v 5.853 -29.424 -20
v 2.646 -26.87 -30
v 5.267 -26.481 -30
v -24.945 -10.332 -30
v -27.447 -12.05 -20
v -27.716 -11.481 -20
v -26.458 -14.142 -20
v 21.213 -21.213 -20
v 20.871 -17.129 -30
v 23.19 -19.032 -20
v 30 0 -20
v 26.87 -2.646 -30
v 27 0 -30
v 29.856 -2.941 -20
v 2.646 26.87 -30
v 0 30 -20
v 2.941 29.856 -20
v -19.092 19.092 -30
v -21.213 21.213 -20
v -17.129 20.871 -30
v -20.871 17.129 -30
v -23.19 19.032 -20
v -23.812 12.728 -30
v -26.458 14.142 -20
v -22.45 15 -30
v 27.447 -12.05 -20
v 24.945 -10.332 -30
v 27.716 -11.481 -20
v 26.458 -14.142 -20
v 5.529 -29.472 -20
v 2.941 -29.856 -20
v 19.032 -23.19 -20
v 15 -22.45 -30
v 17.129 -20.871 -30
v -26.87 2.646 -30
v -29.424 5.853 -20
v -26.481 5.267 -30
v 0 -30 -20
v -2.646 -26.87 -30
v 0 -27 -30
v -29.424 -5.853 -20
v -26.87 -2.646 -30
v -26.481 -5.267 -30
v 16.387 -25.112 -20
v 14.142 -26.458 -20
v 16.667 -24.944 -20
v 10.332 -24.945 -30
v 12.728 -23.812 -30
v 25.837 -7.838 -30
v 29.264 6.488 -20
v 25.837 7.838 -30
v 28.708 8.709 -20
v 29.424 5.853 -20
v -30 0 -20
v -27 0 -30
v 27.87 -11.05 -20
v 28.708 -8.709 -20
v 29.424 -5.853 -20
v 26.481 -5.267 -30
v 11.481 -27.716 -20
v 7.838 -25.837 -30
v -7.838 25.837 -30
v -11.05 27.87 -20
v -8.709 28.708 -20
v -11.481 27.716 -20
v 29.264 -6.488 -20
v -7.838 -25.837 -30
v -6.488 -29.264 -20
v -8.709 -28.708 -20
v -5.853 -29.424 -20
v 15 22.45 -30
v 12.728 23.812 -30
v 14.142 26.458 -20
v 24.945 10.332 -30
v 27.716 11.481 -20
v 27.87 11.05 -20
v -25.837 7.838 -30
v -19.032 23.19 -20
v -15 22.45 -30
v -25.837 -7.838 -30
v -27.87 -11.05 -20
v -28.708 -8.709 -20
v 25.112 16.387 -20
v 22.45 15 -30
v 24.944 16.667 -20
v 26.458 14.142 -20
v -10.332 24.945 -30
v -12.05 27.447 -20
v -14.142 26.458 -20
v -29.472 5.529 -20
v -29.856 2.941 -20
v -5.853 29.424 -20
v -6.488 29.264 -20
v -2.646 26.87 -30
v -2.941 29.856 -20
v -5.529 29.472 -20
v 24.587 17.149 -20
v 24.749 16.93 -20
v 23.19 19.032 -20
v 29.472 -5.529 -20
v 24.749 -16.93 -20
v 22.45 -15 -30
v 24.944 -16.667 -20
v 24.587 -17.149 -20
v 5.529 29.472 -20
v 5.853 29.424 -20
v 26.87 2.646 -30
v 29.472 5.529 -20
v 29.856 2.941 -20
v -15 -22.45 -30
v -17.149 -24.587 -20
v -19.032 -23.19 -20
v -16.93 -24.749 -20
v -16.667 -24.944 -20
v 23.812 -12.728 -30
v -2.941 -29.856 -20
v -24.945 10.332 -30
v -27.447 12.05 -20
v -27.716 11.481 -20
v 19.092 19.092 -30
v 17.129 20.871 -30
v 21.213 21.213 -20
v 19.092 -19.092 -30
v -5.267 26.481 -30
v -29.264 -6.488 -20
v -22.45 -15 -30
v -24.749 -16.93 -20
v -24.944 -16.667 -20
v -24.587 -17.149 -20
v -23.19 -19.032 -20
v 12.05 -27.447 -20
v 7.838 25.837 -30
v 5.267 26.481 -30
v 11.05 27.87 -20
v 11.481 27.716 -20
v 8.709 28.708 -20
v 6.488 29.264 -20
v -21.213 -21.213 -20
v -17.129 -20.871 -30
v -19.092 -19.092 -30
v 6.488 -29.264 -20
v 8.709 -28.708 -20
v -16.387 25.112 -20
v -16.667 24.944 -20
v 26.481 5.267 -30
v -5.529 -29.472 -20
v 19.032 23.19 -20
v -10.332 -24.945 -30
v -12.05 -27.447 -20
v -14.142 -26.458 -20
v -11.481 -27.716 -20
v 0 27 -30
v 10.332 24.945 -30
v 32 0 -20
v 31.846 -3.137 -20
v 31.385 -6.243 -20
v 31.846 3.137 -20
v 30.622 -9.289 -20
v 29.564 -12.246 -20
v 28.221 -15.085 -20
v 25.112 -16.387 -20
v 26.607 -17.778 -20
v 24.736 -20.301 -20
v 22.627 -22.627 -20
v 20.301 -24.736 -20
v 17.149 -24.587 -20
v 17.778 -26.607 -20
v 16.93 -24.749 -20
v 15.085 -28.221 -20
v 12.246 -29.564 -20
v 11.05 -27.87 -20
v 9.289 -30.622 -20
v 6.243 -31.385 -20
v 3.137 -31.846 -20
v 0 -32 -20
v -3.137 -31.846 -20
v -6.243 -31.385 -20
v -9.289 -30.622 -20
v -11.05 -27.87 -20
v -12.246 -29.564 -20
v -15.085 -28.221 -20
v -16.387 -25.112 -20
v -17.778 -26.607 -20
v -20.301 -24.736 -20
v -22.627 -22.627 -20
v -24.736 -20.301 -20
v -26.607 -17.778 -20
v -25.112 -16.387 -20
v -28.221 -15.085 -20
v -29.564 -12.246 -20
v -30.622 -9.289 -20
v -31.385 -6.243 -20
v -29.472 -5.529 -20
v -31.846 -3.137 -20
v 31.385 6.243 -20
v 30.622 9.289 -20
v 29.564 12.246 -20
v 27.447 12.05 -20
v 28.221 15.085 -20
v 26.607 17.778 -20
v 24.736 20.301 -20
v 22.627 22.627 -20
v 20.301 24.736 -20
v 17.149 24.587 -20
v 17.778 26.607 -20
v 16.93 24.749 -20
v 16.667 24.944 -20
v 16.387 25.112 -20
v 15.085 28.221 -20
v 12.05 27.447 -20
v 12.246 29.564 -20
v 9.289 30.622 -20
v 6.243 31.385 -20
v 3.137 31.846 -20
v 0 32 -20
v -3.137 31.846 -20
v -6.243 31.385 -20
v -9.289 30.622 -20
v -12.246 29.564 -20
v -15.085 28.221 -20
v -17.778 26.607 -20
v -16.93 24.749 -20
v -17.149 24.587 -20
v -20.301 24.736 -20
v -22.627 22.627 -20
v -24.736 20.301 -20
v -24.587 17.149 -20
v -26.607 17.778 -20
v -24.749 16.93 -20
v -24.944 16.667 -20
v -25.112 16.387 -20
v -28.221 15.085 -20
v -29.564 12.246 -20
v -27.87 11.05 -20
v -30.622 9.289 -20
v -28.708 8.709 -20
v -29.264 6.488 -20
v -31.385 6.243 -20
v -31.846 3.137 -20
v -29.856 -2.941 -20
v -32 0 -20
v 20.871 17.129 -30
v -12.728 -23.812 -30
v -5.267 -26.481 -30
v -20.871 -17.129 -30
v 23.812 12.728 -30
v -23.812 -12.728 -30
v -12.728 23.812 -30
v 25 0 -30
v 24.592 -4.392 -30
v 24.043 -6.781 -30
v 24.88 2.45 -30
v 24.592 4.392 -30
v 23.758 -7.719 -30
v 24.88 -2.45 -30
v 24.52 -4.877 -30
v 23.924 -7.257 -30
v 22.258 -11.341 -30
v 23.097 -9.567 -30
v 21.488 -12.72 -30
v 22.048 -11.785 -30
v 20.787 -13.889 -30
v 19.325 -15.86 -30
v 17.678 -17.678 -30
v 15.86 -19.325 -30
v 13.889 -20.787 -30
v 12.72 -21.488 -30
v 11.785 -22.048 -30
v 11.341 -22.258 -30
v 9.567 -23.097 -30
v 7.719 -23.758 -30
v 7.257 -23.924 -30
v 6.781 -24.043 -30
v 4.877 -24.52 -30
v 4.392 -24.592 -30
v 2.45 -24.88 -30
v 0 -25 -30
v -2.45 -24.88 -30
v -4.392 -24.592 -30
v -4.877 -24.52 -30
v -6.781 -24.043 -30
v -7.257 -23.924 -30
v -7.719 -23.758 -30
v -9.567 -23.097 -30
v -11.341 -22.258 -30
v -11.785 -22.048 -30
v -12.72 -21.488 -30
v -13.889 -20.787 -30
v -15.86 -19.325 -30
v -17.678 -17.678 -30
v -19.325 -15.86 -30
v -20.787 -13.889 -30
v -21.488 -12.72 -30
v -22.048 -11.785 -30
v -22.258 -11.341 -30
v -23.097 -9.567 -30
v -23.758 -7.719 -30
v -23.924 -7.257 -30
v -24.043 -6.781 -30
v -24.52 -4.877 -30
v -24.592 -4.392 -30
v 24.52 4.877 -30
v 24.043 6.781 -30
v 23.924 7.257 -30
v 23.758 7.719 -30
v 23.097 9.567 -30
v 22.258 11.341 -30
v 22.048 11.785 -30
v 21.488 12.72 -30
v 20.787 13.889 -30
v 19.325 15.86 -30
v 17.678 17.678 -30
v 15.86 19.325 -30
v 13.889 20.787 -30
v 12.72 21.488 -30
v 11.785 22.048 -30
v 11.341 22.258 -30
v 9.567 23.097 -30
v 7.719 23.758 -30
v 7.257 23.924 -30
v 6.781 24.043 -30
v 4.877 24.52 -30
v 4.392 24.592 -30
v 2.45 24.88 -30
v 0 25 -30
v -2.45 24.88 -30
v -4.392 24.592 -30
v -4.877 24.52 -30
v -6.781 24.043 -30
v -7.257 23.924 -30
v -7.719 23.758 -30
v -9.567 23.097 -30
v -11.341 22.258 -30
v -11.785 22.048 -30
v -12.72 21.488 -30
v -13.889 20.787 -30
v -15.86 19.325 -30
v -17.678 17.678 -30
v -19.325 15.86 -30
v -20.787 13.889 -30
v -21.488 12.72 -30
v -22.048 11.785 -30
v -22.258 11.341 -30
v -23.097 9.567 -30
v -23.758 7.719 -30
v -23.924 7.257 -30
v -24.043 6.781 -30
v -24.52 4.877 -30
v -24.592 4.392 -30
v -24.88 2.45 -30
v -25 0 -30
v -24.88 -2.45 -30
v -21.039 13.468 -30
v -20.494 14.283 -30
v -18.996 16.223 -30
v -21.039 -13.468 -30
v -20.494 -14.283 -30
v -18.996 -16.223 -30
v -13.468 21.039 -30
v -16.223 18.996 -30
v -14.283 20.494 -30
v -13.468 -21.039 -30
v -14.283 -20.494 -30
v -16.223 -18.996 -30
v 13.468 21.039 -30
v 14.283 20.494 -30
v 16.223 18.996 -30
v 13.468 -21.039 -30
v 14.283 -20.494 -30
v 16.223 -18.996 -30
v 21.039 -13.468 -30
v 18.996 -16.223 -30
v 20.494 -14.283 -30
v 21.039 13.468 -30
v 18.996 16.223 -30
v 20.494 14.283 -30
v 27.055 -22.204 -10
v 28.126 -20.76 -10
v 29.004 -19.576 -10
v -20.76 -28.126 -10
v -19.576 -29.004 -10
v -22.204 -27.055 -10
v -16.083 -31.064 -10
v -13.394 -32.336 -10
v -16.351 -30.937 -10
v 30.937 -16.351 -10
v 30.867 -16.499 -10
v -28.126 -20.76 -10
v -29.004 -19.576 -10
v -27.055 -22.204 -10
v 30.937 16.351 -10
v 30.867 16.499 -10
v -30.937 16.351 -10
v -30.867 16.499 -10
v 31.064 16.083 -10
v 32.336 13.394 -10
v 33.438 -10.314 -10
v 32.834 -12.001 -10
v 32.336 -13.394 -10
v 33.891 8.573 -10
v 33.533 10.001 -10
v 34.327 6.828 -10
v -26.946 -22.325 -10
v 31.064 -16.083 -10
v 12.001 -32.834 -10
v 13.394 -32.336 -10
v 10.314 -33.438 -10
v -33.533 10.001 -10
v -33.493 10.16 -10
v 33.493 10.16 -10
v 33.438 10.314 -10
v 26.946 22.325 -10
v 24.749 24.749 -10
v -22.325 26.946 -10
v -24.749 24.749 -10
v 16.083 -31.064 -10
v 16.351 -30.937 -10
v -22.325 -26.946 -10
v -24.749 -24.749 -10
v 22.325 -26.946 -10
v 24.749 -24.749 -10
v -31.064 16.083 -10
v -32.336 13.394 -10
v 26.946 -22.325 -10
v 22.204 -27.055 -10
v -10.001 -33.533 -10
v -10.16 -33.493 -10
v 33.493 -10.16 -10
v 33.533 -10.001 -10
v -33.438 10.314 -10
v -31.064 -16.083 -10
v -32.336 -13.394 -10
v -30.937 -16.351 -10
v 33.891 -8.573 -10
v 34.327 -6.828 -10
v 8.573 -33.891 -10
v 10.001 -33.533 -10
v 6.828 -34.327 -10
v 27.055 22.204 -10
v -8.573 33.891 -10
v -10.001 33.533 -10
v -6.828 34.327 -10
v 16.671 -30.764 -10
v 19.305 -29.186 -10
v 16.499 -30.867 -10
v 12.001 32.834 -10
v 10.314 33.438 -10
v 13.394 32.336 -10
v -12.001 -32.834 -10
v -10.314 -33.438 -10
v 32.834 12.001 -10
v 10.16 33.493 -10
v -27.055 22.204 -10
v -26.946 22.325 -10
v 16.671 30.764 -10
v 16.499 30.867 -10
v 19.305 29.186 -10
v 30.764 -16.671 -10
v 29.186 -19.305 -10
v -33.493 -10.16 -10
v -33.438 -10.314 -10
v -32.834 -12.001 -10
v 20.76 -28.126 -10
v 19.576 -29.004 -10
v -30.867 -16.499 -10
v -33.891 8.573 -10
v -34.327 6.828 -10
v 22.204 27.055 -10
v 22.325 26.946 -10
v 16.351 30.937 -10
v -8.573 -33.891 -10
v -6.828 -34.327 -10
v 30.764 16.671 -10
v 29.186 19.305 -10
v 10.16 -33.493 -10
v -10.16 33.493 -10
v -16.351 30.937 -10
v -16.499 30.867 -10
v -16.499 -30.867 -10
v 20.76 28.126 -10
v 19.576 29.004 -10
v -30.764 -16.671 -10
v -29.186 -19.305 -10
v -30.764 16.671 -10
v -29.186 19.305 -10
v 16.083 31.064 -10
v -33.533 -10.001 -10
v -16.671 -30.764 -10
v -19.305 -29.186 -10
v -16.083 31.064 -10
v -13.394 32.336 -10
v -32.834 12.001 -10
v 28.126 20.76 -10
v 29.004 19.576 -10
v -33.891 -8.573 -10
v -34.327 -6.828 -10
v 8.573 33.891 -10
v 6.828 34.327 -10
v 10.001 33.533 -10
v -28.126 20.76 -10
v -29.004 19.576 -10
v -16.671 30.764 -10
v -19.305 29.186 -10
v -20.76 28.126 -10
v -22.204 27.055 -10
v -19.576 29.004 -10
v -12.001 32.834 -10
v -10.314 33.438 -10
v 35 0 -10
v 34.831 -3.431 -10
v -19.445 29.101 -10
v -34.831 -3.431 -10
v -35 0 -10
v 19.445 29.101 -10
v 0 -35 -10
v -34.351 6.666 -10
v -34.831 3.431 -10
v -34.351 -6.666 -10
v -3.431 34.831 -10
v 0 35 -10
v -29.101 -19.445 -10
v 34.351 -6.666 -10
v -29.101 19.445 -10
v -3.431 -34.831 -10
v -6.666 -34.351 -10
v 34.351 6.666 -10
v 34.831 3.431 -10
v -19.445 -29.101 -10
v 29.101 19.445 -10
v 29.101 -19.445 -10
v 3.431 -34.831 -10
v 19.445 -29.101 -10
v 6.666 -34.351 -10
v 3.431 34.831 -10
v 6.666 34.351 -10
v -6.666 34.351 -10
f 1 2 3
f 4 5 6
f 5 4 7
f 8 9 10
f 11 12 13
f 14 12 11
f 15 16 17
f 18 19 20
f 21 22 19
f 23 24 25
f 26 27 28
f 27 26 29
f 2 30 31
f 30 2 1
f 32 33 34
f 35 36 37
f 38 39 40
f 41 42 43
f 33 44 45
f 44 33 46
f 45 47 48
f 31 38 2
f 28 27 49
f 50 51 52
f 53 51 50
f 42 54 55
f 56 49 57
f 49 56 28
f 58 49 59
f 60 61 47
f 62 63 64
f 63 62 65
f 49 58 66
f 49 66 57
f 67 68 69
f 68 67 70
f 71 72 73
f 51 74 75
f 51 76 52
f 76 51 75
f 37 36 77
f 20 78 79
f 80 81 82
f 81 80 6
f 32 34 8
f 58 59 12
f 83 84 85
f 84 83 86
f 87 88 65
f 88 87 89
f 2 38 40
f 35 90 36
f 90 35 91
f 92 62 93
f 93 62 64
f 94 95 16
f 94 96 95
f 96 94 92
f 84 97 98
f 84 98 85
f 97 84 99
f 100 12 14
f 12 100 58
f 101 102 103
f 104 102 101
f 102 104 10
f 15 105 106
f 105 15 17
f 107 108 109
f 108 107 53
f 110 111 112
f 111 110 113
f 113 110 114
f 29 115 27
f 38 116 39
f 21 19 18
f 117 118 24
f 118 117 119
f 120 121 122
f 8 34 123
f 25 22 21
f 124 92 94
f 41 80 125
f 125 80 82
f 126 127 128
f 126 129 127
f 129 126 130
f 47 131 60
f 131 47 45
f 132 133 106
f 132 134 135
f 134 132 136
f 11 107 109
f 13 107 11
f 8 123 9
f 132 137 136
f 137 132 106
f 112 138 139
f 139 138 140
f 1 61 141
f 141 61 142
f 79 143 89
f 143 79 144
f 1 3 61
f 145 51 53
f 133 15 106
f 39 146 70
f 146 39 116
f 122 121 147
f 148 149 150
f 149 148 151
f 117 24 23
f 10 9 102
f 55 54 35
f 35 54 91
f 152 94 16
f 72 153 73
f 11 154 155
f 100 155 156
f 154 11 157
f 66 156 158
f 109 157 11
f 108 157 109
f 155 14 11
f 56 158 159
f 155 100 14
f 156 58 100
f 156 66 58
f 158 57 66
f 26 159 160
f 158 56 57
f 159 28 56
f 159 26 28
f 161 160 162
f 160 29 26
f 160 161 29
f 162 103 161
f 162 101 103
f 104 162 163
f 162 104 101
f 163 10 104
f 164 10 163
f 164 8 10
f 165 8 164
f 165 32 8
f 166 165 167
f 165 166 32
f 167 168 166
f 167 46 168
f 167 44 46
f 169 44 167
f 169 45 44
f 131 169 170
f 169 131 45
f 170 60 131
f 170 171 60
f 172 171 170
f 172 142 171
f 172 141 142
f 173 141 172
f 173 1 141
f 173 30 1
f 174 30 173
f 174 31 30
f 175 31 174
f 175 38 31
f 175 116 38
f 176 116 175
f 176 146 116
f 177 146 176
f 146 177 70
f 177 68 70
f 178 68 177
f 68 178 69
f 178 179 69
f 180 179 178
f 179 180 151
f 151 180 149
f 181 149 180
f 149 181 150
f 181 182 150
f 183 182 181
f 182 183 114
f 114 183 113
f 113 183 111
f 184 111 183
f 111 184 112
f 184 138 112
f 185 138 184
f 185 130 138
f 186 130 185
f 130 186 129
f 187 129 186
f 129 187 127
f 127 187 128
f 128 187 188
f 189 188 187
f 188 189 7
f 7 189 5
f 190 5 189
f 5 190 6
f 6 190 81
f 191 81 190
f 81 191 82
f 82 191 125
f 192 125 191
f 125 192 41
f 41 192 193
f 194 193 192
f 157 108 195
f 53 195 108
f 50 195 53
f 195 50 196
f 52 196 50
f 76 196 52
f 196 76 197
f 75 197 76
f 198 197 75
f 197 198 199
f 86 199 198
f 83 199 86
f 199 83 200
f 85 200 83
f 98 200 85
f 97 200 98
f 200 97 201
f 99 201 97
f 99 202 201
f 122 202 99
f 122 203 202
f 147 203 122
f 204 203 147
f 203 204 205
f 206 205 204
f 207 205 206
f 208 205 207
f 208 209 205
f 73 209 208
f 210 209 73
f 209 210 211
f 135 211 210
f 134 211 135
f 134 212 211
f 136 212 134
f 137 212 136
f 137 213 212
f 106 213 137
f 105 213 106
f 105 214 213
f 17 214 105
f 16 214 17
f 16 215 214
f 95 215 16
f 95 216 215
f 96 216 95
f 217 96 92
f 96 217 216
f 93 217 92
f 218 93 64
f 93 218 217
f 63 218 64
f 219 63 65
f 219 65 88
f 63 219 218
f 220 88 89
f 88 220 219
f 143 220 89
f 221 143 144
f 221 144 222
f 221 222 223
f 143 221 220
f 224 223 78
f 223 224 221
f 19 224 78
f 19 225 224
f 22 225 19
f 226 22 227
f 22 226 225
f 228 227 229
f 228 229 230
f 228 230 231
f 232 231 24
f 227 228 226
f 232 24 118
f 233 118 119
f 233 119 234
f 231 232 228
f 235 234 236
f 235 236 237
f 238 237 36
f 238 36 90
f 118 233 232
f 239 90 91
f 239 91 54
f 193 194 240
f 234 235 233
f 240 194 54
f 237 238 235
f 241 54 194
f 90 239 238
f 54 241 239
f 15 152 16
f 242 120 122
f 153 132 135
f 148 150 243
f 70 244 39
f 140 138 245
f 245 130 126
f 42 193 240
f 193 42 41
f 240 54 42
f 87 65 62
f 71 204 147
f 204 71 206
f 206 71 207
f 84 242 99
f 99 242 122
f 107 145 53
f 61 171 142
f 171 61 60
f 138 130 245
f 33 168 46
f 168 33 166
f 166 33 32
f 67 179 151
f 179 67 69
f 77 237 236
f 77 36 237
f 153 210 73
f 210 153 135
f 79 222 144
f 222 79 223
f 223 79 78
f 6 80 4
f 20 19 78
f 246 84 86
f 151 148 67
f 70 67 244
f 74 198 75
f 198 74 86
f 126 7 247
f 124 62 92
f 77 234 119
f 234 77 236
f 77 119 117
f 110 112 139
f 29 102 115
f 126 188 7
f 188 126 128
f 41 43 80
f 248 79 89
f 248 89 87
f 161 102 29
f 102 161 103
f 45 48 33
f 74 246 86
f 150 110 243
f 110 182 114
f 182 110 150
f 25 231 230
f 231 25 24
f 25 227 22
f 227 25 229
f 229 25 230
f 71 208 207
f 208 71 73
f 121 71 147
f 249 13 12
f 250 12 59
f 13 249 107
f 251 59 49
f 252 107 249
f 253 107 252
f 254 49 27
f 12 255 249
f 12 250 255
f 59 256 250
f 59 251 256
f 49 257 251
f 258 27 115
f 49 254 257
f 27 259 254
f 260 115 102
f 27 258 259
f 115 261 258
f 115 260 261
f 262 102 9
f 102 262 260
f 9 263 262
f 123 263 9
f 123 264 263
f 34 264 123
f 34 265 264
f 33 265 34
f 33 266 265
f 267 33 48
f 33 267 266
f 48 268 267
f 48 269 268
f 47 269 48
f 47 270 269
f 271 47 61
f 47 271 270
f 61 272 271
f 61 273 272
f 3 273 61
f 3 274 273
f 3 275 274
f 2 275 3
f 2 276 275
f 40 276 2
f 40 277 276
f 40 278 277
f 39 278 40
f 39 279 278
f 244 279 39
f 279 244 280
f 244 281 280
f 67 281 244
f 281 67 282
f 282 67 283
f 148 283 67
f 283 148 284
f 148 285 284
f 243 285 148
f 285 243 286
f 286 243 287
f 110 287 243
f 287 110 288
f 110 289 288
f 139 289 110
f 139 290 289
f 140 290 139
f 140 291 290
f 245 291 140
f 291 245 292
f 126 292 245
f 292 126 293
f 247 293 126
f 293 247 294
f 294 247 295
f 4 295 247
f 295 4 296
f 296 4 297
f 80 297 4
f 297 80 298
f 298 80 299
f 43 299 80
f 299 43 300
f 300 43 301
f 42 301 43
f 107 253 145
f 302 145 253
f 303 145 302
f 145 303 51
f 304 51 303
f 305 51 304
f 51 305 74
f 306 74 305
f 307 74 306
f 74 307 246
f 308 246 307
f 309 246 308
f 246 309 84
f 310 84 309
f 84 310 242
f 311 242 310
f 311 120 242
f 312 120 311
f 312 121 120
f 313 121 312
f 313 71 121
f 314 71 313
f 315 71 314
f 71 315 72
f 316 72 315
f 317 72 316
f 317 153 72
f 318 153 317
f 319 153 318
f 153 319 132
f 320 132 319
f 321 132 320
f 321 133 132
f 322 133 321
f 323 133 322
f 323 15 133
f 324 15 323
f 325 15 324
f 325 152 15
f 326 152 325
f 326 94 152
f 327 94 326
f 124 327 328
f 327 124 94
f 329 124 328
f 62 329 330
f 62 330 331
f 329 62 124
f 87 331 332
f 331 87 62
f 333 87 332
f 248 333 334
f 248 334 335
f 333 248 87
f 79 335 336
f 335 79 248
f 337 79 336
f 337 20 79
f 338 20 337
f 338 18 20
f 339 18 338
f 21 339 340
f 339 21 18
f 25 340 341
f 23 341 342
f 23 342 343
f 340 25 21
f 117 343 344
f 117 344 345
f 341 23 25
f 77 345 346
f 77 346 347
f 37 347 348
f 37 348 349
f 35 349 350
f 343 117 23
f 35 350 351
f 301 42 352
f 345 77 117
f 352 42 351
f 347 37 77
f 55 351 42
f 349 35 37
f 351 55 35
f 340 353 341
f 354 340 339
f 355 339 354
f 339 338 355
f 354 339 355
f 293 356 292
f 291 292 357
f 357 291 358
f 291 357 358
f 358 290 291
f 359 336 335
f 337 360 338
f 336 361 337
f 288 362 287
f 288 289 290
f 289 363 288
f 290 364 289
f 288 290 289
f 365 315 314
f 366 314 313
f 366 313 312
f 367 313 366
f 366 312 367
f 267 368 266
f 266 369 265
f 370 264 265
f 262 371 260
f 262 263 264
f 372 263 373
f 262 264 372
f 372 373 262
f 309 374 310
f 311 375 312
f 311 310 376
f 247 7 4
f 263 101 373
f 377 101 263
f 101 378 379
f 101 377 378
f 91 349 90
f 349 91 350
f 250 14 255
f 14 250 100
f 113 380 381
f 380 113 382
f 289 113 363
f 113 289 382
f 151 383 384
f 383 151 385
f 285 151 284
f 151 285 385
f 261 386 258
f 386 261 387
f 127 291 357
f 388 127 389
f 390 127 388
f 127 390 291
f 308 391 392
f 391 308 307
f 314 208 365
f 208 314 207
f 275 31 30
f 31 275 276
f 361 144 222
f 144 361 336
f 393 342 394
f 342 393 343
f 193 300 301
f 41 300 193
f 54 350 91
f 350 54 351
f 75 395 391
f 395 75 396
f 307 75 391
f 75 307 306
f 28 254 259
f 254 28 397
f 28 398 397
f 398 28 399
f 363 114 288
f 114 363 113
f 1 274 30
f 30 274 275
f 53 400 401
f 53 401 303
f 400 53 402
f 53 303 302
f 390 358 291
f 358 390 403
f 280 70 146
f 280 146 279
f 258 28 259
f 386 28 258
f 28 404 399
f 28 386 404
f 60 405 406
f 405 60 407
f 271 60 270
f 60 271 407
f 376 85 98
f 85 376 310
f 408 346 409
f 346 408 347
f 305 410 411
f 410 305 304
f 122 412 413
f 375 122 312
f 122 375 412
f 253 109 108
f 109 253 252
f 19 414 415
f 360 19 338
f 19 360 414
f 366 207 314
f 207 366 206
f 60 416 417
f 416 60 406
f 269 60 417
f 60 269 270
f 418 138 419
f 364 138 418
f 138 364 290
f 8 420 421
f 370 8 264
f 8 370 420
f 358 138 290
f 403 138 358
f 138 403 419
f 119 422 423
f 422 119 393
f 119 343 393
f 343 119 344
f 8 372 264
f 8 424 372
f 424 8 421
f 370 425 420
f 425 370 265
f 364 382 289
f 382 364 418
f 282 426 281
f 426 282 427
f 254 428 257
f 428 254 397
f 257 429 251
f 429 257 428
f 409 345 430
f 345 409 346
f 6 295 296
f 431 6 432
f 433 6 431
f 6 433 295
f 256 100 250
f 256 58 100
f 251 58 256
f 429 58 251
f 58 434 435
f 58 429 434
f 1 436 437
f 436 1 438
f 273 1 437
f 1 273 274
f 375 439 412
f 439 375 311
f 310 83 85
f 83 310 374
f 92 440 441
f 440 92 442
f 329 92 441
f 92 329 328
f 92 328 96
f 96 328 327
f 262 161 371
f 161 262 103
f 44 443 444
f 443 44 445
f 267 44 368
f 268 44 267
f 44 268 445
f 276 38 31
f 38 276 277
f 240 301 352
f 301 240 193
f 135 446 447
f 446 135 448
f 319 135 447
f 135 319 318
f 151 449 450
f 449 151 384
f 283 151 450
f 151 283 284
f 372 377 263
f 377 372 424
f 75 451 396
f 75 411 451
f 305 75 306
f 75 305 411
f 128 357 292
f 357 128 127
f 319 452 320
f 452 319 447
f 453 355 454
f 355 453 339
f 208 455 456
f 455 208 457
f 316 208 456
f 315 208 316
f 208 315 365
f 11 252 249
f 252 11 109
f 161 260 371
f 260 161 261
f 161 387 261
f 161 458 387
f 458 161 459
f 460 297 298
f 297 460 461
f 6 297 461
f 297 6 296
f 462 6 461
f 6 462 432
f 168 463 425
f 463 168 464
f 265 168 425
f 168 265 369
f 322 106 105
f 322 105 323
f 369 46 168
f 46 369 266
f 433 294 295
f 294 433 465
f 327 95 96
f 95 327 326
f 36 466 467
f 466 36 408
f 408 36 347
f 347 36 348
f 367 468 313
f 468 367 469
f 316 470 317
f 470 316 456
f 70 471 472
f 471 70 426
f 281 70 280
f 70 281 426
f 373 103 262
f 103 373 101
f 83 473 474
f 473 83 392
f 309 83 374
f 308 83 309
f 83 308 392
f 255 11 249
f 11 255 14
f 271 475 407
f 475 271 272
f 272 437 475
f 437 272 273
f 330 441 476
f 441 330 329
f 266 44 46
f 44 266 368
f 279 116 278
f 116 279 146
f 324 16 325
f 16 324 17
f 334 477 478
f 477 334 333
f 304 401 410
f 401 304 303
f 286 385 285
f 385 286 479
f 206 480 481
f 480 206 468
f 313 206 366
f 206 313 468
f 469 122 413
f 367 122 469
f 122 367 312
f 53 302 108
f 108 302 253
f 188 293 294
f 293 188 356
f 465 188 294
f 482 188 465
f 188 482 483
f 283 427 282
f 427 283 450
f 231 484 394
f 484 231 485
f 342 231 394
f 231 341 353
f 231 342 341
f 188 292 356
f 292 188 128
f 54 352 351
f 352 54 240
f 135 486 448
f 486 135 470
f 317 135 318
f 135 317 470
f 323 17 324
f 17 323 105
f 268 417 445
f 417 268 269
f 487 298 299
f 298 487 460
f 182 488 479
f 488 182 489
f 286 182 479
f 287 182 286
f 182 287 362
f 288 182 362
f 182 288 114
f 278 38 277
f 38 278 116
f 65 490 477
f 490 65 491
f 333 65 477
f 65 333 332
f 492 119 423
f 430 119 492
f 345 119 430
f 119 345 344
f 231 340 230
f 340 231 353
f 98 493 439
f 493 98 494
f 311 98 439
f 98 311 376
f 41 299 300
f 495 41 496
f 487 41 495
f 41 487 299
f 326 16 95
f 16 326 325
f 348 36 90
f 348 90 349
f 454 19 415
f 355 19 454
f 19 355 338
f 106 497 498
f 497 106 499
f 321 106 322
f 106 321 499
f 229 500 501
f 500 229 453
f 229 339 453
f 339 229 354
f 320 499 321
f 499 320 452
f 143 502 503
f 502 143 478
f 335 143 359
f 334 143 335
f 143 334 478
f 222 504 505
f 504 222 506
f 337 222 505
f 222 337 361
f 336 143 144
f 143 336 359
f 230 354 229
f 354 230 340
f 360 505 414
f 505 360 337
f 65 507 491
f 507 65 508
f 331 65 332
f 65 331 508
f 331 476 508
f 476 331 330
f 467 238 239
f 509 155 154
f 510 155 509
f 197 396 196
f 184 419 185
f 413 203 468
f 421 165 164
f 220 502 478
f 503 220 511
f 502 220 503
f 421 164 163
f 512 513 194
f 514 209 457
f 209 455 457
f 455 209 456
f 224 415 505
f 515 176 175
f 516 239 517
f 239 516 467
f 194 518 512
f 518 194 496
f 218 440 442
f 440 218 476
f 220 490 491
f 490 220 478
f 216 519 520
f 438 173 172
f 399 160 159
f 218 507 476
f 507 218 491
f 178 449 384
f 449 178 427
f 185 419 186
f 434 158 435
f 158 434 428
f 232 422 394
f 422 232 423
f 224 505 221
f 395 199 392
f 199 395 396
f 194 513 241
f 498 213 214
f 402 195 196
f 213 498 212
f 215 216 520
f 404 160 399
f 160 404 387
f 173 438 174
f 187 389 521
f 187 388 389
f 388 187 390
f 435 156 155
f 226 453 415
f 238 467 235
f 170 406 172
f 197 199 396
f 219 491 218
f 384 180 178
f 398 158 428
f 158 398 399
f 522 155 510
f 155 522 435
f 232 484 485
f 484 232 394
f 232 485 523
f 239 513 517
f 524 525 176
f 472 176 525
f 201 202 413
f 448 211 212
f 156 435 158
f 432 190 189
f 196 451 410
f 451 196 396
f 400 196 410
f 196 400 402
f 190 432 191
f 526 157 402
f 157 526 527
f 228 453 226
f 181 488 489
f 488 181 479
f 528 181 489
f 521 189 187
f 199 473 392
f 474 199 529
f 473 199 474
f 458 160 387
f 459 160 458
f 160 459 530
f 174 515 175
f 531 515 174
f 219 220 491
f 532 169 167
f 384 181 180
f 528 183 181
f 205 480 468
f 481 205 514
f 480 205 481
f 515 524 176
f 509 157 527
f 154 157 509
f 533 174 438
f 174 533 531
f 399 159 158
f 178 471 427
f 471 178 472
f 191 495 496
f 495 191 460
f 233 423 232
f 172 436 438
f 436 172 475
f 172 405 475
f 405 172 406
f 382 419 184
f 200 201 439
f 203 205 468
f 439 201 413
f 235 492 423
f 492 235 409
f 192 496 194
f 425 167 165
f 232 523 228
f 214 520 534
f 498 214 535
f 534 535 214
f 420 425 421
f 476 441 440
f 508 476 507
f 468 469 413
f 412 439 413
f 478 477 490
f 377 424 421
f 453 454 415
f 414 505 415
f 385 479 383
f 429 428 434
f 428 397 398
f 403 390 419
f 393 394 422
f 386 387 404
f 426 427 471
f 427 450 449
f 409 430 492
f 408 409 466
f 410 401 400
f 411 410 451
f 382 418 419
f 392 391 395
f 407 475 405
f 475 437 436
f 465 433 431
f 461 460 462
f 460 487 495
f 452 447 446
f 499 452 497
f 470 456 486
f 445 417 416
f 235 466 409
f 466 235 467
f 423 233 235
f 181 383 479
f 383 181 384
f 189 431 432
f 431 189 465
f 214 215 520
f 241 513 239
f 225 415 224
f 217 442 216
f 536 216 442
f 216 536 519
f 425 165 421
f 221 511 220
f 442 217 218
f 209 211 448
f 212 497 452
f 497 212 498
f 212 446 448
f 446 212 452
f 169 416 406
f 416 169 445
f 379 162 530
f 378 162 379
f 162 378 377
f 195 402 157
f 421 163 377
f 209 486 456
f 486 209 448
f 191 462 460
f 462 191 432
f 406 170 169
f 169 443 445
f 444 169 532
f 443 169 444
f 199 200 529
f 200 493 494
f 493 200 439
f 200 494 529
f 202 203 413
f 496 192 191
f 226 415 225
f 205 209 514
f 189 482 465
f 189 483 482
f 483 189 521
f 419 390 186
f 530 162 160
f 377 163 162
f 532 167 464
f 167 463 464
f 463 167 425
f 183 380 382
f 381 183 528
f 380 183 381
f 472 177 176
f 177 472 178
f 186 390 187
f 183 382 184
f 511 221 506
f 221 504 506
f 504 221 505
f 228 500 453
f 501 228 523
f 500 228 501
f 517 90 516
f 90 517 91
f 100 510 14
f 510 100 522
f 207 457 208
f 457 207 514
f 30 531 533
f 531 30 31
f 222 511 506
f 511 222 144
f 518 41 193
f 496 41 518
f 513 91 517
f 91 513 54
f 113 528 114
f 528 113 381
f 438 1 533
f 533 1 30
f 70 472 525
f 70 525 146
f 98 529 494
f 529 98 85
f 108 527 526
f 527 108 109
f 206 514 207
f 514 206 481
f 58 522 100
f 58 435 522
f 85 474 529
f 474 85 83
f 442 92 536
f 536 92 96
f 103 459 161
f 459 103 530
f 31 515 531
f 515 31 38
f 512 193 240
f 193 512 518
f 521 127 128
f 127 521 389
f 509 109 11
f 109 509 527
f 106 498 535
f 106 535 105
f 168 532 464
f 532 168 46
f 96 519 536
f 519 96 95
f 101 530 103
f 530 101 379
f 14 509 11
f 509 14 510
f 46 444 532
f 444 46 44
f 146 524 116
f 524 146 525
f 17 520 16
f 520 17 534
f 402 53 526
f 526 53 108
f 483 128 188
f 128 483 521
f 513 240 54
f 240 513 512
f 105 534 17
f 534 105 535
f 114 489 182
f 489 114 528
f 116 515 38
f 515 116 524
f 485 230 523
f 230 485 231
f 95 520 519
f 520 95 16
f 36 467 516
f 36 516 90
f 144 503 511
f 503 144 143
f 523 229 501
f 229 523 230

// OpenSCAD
// Start: lazy_union
part0_1_mat1_5_cured();
part0_0_mat0_5_cured();
// End: lazy_union

// Modules.

// 'PartMaterial part0 0 - mat0 5.0'
module part0_0_mat0_5() {
  // 'None : _combine_solids_and_holes'
  union() {
    // '_combine_solids_and_holes'
    difference() {
      // 'default : _combine_solids_and_holes'
      union() {
        // ('ext', 0)
        multmatrix(m=[[1.0, 0.0, 0.0, 0.0], [0.0, -1.0, 0.0, 0.0], [0.0, 0.0, -1.0, -10.0], [0.0, 0.0, 0.0, 1.0]]) {
          // ('ext', 0)
          color(c=[1.0, 0.25, 0.2, 0.7]) {
            // "('ext', 0) : _combine_solids_and_holes"
            union() {
              // ('ext', 0)
              cylinder(h=10.0, r1=35.0, r2=32.0, center=false, $fn=64);
            }
          }
        }
      }
      // 'default'
      multmatrix(m=[[1.0, 0.0, 0.0, 0.0], [-0.0, -1.0, -0.0, -0.0], [-0.0, -0.0, -1.0, -0.0], [0.0, 0.0, 0.0, 1.0]]) {
        // 'master : _combine_solids_and_holes'
        union() {
          // 'master'
          cylinder(h=60.0, r1=40.0, r2=10.0, center=false, $fn=64);
        }
      }
    }
  }
} // end module part0_0_mat0_5

// 'PartMaterial part0 0 - mat0 5.0'
module part0_0_mat0_5_cured() {
  difference() {
    part0_0_mat0_5();
    // "cured PartMaterial(part=Part(name='part0', priority=0), material=Material(name='mat0', priority=5.0, kind=MaterialKind(physical=True)))"
    union() {
      part1_2_mat2_5();
      part0_1_mat1_5();
    }
  }
} // end module part0_0_mat0_5_cured

// 'PartMaterial part0 1 - mat1 5.0'
module part0_1_mat1_5() {
  // 'None : _combine_solids_and_holes'
  union() {
    // '_combine_solids_and_holes'
    difference() {
      // 'default : _combine_solids_and_holes'
      union() {
        // ('ext', 1)
        multmatrix(m=[[1.0, 0.0, 0.0, 0.0], [0.0, -1.0, 0.0, 0.0], [0.0, 0.0, -1.0, -20.0], [0.0, 0.0, 0.0, 1.0]]) {
          // ('ext', 1)
          color(c=[1.0, 0.5, 0.2, 0.7]) {
            // "('ext', 1) : _combine_solids_and_holes"
            union() {
              // ('ext', 1)
              cylinder(h=10.0, r1=30.0, r2=27.0, center=false, $fn=64);
            }
          }
        }
      }
      // 'default'
      multmatrix(m=[[1.0, 0.0, 0.0, 0.0], [-0.0, -1.0, -0.0, -0.0], [-0.0, -0.0, -1.0, -0.0], [0.0, 0.0, 0.0, 1.0]]) {
        // 'master : _combine_solids_and_holes'
        union() {
          // 'master'
          cylinder(h=60.0, r1=40.0, r2=10.0, center=false, $fn=64);
        }
      }
    }
  }
} // end module part0_1_mat1_5

// 'PartMaterial part0 1 - mat1 5.0'
module part0_1_mat1_5_cured() {
  difference() {
    part0_1_mat1_5();
    part1_2_mat2_5();
  }
} // end module part0_1_mat1_5_cured

// 'PartMaterial part1 2 - mat2 5.0'
module part1_2_mat2_5() {
  // 'None : _combine_solids_and_holes'
  union() {
    // '_combine_solids_and_holes'
    difference() {
      // 'default : _combine_solids_and_holes'
      union() {
        // ('ext', 2)
        multmatrix(m=[[1.0, 0.0, 0.0, 0.0], [0.0, -1.0, 0.0, 0.0], [0.0, 0.0, -1.0, -30.0], [0.0, 0.0, 0.0, 1.0]]) {
          // ('ext', 2)
          color(c=[1.0, 0.75, 0.2, 0.7]) {
            // "('ext', 2) : _combine_solids_and_holes"
            union() {
              // ('ext', 2)
              cylinder(h=10.0, r1=25.0, r2=22.0, center=false, $fn=64);
            }
          }
        }
      }
      // 'default'
      multmatrix(m=[[1.0, 0.0, 0.0, 0.0], [-0.0, -1.0, -0.0, -0.0], [-0.0, -0.0, -1.0, -0.0], [0.0, 0.0, 0.0, 1.0]]) {
        // 'master : _combine_solids_and_holes'
        union() {
          // 'master'
          cylinder(h=60.0, r1=40.0, r2=10.0, center=false, $fn=64);
        }
      }
    }
  }
} // end module part1_2_mat2_5
